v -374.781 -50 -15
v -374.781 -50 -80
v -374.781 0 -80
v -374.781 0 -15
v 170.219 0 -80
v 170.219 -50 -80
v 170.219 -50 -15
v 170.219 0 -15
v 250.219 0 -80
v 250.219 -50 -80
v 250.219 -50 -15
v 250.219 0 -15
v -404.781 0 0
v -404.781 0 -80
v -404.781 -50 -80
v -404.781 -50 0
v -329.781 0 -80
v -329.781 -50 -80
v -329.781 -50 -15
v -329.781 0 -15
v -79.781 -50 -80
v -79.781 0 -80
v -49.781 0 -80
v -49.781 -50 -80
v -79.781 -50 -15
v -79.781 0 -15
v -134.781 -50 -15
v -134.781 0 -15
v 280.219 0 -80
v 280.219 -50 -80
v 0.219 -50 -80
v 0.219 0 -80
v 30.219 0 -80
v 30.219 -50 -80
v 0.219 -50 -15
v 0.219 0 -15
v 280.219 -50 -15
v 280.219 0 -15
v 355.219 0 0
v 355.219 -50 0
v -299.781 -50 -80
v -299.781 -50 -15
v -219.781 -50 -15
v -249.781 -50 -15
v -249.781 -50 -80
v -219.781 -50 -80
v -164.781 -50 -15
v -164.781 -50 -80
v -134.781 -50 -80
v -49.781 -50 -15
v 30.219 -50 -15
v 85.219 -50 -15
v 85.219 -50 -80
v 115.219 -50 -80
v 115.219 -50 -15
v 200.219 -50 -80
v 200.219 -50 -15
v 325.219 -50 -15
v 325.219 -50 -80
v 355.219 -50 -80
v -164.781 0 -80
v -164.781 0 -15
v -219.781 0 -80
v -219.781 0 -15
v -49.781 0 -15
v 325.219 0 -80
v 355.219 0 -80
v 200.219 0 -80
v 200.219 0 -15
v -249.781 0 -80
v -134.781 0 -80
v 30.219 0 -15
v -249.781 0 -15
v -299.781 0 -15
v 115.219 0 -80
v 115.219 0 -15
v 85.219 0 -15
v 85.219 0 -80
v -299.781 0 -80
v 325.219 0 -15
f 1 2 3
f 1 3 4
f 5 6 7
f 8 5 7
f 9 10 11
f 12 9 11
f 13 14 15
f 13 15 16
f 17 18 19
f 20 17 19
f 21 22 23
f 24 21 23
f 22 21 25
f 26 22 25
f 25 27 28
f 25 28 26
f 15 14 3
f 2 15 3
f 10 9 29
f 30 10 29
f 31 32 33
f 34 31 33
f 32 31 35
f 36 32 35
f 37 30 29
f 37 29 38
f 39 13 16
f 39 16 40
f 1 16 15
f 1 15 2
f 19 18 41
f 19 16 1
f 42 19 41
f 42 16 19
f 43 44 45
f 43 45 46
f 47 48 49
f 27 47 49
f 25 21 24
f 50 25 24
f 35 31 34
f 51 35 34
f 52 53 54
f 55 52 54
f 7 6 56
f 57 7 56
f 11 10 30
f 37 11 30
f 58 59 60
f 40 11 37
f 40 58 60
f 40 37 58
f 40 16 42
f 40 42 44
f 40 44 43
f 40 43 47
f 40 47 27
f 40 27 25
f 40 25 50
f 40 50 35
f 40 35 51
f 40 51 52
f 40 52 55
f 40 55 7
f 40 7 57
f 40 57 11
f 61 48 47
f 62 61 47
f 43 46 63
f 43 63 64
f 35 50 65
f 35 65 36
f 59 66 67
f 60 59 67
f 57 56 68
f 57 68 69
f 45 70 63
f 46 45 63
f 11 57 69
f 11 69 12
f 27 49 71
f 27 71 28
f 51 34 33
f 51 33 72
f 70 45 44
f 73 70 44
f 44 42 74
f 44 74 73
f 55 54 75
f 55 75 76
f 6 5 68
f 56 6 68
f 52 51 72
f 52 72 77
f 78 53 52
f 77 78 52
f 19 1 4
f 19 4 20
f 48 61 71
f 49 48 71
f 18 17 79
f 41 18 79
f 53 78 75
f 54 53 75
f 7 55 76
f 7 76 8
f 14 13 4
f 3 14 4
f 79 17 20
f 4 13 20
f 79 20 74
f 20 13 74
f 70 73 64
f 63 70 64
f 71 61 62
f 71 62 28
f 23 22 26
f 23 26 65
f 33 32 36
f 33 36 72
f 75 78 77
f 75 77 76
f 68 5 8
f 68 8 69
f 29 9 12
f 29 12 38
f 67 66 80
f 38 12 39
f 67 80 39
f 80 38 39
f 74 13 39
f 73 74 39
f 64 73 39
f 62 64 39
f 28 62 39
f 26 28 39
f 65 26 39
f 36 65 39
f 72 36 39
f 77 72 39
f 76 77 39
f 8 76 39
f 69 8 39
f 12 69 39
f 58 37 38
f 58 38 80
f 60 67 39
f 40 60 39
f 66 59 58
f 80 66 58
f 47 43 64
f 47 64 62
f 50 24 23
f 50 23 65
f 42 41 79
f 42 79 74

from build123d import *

# Parameters (mm, degrees)
F0_W     = 760
F0_H     = 80
F1_DEPTH = 50
F2_W     = 45
F2_H     = 65
F2_W_2   = 50
F2_W_3   = 55
F3_DEPTH = 50


with BuildPart() as f1:
    # F0 (on Front) → F1 (new body)
    with BuildSketch(Plane.XZ):
        with Locations((-24.780855, -40)):
            Rectangle(F0_W, F0_H)
    extrude(amount=F1_DEPTH)

    # F2 (on face) → F3 (cut)
    with BuildSketch(Plane.XZ.offset(50)):
        with Locations((-352.280855, -47.5)):
            Rectangle(F2_W, F2_H)
        with Locations((-274.780855, -47.5)):
            Rectangle(F2_W_2, F2_H)
        with Locations((-192.280855, -47.5)):
            Rectangle(F2_W_3, F2_H)
        with Locations((-107.280855, -47.5)):
            Rectangle(F2_W_3, F2_H)
        with Locations((-24.780855, -47.5)):
            Rectangle(F2_W_2, F2_H)
        with Locations((57.719145, -47.5)):
            Rectangle(F2_W_3, F2_H)
        with Locations((142.719145, -47.5)):
            Rectangle(F2_W_3, F2_H)
        with Locations((225.219145, -47.5)):
            Rectangle(F2_W_2, F2_H)
        with Locations((302.719145, -47.5)):
            Rectangle(F2_W, F2_H)
    extrude(amount=-F3_DEPTH, mode=Mode.SUBTRACT)


solid = f1.part
